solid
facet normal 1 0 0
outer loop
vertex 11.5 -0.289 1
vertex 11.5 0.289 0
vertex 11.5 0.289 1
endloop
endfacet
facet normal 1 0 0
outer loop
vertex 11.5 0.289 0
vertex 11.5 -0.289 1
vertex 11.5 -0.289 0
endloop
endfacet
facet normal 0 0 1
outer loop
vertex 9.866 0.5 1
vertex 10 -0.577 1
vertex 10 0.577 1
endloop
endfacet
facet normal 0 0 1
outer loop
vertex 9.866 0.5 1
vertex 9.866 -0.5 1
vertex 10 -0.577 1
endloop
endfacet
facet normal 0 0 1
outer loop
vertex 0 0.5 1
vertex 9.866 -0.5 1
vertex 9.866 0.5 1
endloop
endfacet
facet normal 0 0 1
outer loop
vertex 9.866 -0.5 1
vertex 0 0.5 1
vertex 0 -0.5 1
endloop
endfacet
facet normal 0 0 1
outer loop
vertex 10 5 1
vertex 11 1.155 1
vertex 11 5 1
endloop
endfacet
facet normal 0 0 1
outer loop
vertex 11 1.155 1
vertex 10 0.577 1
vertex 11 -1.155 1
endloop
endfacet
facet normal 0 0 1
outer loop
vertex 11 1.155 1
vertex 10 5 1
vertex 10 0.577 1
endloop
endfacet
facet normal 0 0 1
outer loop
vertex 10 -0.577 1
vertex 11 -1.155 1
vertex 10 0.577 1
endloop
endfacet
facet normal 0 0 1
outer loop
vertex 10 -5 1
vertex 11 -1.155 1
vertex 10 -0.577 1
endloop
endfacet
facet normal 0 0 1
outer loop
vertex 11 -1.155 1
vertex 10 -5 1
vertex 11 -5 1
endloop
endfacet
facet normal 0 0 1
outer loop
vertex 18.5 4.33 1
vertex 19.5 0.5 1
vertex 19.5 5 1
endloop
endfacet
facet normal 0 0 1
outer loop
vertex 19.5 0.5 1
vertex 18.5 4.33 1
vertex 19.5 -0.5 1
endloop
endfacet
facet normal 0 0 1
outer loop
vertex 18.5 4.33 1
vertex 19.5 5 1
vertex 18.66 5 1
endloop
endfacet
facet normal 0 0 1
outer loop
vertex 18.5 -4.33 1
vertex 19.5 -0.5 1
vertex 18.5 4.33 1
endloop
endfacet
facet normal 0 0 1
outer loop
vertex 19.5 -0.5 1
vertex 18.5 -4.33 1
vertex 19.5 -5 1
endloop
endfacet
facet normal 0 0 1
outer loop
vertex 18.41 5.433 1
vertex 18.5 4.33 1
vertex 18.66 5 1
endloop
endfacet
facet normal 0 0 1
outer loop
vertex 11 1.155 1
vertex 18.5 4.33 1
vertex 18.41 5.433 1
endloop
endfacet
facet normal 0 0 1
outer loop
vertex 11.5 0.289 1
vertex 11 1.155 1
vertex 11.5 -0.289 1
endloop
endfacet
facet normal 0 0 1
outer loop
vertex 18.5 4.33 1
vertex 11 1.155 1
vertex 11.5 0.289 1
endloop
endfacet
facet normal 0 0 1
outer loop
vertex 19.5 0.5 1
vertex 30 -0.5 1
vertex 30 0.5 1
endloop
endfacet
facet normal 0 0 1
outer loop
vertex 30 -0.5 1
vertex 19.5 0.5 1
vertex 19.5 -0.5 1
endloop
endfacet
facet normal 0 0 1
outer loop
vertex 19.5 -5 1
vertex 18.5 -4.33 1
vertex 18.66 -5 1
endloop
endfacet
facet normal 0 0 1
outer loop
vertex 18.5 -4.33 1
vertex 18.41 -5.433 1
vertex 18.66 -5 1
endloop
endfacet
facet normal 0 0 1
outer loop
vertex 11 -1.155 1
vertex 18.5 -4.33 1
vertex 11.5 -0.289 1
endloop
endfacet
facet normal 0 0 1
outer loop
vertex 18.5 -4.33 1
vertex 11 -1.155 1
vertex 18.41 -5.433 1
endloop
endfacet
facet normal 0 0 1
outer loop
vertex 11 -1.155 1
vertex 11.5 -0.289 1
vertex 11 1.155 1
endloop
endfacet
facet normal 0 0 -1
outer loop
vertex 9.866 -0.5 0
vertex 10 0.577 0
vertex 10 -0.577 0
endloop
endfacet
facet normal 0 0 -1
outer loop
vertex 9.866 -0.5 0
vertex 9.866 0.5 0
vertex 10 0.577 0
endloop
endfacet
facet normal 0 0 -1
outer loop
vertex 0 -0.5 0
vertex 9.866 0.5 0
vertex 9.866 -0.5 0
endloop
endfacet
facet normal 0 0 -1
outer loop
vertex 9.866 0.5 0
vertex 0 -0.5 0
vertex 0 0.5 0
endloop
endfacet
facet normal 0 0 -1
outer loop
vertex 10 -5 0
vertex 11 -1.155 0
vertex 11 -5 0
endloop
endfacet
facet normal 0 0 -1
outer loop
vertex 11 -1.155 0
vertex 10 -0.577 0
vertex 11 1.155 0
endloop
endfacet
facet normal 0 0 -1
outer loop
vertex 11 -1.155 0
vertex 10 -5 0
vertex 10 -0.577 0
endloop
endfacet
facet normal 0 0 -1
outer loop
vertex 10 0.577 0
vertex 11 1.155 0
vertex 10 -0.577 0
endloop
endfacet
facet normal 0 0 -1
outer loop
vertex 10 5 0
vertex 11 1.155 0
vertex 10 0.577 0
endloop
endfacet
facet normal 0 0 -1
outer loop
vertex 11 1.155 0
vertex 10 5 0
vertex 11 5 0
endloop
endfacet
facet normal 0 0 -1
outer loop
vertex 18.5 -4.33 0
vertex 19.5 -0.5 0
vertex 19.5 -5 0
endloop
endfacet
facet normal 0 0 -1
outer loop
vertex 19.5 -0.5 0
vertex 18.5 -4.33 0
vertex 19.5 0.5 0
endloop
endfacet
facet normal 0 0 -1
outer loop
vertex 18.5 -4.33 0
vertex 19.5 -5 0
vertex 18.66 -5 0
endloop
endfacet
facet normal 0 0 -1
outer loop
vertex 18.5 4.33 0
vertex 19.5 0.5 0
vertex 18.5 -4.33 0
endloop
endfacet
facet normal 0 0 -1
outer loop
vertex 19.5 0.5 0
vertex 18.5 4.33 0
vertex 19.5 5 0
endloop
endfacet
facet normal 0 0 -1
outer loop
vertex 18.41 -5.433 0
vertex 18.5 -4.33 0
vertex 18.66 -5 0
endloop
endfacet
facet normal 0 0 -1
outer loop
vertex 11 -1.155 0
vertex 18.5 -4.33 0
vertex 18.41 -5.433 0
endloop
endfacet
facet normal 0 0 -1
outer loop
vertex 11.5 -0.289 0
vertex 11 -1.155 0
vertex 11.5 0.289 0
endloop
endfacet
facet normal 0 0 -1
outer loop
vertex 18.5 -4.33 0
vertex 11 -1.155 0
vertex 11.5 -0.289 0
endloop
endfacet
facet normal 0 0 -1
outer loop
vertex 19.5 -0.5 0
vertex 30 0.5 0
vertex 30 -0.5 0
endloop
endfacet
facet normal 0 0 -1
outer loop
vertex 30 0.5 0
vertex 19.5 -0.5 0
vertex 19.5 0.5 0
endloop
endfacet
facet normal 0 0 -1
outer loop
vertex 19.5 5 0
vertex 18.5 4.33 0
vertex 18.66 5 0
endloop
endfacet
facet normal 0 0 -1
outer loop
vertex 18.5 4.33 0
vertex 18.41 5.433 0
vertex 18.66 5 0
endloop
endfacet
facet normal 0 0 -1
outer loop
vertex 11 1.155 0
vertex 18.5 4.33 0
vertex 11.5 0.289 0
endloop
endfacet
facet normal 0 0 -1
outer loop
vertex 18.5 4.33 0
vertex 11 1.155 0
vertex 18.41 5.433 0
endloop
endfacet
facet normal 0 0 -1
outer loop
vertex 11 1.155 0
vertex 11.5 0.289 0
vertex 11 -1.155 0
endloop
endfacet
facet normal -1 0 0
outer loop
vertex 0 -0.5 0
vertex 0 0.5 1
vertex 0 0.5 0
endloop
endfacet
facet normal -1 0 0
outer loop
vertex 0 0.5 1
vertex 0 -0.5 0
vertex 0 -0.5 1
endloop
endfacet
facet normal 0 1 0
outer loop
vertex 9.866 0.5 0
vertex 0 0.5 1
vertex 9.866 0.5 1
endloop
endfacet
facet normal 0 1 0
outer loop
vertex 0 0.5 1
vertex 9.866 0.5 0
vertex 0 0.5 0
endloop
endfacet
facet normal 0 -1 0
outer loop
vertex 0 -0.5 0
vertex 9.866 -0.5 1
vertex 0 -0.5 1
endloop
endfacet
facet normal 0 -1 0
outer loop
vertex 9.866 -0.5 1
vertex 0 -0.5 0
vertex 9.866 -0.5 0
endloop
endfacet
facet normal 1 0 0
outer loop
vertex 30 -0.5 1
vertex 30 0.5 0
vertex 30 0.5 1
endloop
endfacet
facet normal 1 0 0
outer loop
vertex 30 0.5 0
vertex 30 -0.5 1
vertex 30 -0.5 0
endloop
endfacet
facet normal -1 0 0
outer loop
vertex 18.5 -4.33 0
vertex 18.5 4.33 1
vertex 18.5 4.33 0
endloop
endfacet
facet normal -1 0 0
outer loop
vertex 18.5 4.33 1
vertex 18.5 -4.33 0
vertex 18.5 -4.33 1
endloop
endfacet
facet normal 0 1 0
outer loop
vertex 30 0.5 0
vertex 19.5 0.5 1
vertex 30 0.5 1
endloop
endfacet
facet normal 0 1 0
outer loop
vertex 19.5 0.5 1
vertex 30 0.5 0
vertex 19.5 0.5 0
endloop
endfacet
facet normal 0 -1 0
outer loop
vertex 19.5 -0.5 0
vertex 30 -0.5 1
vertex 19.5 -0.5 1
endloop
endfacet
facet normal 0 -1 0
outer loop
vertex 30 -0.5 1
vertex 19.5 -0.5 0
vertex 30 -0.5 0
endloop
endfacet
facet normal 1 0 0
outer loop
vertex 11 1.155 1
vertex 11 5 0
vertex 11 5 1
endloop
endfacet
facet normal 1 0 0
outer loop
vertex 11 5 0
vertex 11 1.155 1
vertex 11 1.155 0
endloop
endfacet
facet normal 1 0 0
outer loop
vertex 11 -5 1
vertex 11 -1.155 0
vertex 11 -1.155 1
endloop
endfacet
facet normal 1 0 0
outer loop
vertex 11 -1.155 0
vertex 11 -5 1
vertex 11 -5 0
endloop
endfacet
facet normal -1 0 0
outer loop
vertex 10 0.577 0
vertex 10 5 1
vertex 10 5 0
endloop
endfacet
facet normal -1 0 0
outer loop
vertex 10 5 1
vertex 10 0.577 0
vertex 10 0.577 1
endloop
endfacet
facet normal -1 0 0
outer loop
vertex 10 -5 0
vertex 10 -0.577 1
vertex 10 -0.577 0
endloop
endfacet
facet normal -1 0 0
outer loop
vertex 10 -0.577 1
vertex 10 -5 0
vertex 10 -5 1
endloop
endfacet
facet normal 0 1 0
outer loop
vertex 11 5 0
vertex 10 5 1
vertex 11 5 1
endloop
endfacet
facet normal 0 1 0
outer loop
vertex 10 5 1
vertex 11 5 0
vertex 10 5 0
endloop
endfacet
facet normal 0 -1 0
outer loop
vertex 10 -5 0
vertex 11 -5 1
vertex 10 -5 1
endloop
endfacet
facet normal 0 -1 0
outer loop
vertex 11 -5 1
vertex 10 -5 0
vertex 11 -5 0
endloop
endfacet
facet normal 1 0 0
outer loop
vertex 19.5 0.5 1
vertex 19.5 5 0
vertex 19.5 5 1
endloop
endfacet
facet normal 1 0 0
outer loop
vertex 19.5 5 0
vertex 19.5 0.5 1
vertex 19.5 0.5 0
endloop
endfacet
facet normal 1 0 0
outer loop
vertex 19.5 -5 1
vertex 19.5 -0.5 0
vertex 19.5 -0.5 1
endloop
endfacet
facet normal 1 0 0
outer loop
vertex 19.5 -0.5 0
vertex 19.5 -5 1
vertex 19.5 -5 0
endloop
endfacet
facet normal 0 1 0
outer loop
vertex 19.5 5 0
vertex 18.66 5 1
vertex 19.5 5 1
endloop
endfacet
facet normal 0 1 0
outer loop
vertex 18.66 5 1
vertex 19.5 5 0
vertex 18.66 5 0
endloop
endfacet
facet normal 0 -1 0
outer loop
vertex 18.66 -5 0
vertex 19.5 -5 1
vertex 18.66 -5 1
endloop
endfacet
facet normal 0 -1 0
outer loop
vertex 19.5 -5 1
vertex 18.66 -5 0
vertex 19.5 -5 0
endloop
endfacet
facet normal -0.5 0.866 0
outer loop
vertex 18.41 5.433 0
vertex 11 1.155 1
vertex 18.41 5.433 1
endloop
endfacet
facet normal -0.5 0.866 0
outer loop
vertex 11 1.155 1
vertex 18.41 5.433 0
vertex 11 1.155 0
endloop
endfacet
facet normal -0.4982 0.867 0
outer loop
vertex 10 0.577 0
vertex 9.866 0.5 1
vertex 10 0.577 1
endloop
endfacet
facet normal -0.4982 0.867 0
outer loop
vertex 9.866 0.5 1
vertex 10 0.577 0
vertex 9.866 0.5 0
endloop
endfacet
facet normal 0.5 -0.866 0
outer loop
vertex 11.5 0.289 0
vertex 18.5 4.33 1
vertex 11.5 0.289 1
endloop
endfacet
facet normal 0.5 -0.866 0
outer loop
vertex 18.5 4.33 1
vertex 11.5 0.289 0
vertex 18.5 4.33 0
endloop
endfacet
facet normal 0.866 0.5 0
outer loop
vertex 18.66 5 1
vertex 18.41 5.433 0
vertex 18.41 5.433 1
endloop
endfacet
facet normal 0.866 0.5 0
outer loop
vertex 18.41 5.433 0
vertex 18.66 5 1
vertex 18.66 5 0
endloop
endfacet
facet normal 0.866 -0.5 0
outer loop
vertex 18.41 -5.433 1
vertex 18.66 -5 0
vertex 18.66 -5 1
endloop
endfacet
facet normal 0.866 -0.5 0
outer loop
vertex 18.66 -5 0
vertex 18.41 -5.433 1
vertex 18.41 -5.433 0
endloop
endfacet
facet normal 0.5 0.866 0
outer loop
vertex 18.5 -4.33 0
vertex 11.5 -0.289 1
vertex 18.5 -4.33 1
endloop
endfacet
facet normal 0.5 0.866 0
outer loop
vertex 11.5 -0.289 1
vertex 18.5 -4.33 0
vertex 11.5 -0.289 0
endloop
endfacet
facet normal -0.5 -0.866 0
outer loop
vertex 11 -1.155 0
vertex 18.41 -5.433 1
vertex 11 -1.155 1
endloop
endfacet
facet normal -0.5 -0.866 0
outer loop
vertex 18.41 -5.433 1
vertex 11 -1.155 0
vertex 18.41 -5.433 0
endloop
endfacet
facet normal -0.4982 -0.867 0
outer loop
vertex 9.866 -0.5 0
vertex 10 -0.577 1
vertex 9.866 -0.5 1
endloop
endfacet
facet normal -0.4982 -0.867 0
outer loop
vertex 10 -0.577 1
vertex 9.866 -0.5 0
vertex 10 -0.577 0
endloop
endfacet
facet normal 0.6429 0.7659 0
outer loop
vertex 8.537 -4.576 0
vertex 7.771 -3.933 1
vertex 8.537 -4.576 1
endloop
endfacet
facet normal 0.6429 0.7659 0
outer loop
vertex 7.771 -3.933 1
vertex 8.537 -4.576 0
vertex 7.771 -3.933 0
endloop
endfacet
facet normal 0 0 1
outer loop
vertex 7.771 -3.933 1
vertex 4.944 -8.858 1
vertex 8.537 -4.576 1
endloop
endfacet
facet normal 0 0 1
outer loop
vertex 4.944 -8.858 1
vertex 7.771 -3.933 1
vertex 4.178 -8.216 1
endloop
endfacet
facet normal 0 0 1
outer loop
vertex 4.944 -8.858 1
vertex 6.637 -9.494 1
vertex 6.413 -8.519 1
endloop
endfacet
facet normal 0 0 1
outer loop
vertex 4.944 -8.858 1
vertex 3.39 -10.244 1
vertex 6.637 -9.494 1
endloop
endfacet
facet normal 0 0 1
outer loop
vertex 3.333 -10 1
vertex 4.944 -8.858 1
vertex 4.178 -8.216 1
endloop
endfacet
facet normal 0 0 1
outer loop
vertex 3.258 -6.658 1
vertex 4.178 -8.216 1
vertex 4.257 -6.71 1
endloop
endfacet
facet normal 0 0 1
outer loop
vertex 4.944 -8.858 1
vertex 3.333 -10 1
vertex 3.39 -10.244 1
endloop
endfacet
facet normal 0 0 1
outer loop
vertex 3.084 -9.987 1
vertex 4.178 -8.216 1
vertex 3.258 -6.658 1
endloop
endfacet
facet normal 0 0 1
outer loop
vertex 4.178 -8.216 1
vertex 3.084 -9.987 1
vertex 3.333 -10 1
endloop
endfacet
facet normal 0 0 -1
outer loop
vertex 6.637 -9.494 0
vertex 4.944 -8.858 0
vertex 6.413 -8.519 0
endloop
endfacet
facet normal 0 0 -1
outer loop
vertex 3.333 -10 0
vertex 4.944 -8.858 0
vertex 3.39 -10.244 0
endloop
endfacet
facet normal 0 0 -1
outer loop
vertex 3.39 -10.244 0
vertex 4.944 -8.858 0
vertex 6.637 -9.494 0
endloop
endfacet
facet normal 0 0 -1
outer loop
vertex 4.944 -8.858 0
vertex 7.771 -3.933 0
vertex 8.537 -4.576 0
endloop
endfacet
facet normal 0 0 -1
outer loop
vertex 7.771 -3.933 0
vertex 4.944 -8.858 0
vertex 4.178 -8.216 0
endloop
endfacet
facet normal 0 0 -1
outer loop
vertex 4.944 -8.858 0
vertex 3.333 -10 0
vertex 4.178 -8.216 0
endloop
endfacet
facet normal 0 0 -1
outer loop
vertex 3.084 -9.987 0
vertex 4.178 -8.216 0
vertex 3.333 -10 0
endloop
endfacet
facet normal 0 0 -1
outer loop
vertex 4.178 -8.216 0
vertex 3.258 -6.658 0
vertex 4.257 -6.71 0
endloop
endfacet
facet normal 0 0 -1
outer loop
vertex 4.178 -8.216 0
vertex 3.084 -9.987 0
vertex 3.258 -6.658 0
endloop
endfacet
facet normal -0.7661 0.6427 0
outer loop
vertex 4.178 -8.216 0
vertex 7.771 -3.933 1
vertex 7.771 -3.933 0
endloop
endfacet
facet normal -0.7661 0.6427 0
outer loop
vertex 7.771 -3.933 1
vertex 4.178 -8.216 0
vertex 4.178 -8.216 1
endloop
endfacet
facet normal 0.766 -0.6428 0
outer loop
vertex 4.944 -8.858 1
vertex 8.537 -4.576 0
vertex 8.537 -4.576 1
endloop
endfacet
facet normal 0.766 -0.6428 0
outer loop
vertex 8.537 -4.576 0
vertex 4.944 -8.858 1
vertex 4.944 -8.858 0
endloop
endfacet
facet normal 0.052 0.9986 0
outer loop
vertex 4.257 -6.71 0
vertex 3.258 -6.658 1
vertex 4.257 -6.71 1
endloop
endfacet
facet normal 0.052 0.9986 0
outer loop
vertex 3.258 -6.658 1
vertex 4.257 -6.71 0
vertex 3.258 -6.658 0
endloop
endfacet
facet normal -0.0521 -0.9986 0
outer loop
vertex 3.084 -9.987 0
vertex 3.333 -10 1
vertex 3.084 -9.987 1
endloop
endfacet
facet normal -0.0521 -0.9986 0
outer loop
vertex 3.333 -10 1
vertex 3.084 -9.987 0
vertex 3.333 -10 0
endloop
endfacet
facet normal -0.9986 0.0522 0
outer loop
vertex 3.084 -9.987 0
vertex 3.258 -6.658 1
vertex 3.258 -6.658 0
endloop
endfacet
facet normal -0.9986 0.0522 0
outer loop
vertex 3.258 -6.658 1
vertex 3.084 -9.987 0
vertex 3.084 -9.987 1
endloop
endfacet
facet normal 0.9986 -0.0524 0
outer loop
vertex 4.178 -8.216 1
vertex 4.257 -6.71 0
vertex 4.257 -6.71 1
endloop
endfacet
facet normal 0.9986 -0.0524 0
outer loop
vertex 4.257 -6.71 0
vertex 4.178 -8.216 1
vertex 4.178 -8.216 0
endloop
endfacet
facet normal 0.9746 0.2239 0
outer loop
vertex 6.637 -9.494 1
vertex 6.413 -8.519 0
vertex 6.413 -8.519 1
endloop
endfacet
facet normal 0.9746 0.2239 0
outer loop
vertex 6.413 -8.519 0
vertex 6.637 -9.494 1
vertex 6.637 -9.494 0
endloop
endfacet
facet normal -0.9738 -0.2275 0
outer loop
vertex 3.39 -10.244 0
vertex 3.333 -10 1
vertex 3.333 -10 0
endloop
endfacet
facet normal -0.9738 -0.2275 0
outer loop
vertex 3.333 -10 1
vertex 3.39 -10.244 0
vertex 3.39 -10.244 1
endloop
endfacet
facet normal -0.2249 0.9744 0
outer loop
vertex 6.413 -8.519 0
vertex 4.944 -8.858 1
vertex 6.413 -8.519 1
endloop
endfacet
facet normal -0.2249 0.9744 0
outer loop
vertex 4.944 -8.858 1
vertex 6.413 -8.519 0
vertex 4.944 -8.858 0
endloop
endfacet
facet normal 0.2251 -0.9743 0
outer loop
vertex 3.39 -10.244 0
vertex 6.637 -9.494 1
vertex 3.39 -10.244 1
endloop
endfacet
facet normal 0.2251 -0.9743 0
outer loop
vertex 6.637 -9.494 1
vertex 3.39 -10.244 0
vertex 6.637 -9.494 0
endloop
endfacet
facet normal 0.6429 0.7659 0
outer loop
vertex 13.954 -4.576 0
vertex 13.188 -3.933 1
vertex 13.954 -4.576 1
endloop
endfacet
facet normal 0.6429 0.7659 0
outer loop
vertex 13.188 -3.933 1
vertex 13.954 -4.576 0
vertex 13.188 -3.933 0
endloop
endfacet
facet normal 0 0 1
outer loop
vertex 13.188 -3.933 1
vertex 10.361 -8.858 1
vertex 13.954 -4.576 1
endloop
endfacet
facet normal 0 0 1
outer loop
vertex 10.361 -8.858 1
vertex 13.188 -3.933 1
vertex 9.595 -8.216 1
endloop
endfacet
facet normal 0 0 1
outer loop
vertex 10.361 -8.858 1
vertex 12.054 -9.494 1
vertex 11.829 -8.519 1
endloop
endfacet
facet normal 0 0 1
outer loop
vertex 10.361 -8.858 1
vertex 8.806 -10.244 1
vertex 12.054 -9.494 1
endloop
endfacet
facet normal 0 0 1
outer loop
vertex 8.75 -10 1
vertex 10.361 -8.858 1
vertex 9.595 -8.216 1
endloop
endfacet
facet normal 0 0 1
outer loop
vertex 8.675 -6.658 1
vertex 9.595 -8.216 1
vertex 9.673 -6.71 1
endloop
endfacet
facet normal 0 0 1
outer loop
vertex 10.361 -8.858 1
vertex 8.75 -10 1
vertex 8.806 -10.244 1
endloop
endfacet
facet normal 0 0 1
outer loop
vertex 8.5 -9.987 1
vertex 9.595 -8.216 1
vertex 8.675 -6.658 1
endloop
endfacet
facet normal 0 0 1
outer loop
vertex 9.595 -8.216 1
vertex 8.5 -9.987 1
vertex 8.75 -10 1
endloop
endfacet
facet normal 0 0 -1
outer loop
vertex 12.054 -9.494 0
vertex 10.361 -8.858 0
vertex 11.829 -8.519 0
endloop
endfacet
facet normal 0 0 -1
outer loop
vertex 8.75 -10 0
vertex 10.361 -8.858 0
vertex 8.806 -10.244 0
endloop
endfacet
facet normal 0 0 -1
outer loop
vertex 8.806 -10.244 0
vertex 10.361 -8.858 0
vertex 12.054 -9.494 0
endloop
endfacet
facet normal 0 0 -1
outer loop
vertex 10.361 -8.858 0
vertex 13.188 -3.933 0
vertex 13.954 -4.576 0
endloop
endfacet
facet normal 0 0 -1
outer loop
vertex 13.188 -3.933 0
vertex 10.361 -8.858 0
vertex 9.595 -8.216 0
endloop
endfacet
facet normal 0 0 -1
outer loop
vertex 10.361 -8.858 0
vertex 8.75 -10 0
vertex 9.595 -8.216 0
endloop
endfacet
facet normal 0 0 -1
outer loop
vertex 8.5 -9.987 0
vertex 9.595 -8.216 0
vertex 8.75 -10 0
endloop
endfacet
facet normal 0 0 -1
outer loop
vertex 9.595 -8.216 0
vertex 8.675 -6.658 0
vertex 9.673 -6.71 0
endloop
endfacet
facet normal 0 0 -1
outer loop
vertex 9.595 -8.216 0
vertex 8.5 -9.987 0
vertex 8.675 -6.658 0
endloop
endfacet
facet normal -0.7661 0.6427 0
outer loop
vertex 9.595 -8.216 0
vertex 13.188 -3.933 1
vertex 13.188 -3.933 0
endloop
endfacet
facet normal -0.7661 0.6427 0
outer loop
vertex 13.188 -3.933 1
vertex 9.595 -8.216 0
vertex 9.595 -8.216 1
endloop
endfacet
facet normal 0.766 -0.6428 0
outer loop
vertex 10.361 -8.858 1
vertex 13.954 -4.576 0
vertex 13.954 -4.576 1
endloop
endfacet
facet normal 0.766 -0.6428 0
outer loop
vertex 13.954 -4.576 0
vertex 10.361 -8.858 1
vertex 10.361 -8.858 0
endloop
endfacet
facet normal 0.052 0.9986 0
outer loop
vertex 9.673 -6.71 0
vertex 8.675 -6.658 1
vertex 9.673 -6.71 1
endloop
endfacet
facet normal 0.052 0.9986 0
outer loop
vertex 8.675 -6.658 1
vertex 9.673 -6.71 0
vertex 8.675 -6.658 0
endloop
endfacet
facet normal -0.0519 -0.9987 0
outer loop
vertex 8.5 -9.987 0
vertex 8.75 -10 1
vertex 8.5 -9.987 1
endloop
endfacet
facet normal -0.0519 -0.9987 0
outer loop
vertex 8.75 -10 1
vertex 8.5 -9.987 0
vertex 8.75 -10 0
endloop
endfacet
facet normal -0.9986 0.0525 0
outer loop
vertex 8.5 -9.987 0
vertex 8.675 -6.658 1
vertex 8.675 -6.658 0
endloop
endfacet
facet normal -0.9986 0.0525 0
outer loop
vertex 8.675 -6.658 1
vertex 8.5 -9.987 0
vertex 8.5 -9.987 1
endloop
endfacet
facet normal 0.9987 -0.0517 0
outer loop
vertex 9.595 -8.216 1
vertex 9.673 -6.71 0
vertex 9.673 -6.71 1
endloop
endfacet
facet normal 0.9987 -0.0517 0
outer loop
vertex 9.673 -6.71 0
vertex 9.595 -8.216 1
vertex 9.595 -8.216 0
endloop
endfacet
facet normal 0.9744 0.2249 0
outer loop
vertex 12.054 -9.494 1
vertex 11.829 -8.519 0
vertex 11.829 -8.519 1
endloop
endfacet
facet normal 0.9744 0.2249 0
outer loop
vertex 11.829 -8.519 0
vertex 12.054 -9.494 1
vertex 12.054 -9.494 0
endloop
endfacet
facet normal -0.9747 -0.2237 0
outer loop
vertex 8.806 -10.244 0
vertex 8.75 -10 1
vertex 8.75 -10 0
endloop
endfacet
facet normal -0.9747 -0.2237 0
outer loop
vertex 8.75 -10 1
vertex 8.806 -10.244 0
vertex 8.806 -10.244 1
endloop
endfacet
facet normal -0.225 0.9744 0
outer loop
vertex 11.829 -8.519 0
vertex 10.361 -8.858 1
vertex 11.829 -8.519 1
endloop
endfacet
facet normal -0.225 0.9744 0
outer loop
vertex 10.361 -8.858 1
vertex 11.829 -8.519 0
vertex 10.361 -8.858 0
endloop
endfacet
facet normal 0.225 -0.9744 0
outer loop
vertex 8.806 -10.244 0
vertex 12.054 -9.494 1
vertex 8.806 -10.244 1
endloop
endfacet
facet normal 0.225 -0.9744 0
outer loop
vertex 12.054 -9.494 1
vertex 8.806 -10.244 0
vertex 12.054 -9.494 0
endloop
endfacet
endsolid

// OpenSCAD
// file: sym_arrow.scad
module arrow(thickness, length, size, height)
{
    translate([thickness,-thickness/2])cube([length-thickness, thickness, height]);
    rotate([0,0,37])translate([0,-3*thickness/4])cube([size, thickness, height]);
    rotate([0,0,-37])translate([0,-thickness/4])cube([size, thickness, height]);
}
// file: sym_diode.scad
module diode(length, width, thickness, height)
{
    translate([0,-thickness/2,0])cube([(length-width*0.7)/2, thickness, height]);
    translate([(length+width*0.7)/2,-thickness/2,0])cube([(length-width*0.7)/2, thickness, height]);
    
    translate([(length-width)/2,-width/2, 0])cube([thickness, width, height]);
    translate([(length+width*0.7)/2,-width/2, 0])cube([thickness, width, height]);
    //translate([(length+width)/2,-thickness/2,0])cube([(length-width)/2, thickness, height]);
    translate([(length-width)/2,0,0])rotate([0,0,30])translate([0,-thickness/2,0])cube([width, thickness, height]);
    translate([(length-width)/2,0,0])rotate([0,0,-30])translate([0,-thickness/2,0])cube([width, thickness, height]);
}

diode(30, 12, 1, 1);
// main file
use <sym_diode.scad>
use <sym_arrow.scad>

module diode_led(length, width, thickness, height)
{
    diode(length, width, thickness, height);
    translate([width/3,-width, 0]) rotate([0,0,50]) arrow(thickness, 3*width/4, width/3, height);    
    translate([3.5*width/4,-width, 0]) rotate([0,0,50]) arrow(thickness, 3*width/4, width/3, height);
}

diode_led(30, 10, 1, 1);
